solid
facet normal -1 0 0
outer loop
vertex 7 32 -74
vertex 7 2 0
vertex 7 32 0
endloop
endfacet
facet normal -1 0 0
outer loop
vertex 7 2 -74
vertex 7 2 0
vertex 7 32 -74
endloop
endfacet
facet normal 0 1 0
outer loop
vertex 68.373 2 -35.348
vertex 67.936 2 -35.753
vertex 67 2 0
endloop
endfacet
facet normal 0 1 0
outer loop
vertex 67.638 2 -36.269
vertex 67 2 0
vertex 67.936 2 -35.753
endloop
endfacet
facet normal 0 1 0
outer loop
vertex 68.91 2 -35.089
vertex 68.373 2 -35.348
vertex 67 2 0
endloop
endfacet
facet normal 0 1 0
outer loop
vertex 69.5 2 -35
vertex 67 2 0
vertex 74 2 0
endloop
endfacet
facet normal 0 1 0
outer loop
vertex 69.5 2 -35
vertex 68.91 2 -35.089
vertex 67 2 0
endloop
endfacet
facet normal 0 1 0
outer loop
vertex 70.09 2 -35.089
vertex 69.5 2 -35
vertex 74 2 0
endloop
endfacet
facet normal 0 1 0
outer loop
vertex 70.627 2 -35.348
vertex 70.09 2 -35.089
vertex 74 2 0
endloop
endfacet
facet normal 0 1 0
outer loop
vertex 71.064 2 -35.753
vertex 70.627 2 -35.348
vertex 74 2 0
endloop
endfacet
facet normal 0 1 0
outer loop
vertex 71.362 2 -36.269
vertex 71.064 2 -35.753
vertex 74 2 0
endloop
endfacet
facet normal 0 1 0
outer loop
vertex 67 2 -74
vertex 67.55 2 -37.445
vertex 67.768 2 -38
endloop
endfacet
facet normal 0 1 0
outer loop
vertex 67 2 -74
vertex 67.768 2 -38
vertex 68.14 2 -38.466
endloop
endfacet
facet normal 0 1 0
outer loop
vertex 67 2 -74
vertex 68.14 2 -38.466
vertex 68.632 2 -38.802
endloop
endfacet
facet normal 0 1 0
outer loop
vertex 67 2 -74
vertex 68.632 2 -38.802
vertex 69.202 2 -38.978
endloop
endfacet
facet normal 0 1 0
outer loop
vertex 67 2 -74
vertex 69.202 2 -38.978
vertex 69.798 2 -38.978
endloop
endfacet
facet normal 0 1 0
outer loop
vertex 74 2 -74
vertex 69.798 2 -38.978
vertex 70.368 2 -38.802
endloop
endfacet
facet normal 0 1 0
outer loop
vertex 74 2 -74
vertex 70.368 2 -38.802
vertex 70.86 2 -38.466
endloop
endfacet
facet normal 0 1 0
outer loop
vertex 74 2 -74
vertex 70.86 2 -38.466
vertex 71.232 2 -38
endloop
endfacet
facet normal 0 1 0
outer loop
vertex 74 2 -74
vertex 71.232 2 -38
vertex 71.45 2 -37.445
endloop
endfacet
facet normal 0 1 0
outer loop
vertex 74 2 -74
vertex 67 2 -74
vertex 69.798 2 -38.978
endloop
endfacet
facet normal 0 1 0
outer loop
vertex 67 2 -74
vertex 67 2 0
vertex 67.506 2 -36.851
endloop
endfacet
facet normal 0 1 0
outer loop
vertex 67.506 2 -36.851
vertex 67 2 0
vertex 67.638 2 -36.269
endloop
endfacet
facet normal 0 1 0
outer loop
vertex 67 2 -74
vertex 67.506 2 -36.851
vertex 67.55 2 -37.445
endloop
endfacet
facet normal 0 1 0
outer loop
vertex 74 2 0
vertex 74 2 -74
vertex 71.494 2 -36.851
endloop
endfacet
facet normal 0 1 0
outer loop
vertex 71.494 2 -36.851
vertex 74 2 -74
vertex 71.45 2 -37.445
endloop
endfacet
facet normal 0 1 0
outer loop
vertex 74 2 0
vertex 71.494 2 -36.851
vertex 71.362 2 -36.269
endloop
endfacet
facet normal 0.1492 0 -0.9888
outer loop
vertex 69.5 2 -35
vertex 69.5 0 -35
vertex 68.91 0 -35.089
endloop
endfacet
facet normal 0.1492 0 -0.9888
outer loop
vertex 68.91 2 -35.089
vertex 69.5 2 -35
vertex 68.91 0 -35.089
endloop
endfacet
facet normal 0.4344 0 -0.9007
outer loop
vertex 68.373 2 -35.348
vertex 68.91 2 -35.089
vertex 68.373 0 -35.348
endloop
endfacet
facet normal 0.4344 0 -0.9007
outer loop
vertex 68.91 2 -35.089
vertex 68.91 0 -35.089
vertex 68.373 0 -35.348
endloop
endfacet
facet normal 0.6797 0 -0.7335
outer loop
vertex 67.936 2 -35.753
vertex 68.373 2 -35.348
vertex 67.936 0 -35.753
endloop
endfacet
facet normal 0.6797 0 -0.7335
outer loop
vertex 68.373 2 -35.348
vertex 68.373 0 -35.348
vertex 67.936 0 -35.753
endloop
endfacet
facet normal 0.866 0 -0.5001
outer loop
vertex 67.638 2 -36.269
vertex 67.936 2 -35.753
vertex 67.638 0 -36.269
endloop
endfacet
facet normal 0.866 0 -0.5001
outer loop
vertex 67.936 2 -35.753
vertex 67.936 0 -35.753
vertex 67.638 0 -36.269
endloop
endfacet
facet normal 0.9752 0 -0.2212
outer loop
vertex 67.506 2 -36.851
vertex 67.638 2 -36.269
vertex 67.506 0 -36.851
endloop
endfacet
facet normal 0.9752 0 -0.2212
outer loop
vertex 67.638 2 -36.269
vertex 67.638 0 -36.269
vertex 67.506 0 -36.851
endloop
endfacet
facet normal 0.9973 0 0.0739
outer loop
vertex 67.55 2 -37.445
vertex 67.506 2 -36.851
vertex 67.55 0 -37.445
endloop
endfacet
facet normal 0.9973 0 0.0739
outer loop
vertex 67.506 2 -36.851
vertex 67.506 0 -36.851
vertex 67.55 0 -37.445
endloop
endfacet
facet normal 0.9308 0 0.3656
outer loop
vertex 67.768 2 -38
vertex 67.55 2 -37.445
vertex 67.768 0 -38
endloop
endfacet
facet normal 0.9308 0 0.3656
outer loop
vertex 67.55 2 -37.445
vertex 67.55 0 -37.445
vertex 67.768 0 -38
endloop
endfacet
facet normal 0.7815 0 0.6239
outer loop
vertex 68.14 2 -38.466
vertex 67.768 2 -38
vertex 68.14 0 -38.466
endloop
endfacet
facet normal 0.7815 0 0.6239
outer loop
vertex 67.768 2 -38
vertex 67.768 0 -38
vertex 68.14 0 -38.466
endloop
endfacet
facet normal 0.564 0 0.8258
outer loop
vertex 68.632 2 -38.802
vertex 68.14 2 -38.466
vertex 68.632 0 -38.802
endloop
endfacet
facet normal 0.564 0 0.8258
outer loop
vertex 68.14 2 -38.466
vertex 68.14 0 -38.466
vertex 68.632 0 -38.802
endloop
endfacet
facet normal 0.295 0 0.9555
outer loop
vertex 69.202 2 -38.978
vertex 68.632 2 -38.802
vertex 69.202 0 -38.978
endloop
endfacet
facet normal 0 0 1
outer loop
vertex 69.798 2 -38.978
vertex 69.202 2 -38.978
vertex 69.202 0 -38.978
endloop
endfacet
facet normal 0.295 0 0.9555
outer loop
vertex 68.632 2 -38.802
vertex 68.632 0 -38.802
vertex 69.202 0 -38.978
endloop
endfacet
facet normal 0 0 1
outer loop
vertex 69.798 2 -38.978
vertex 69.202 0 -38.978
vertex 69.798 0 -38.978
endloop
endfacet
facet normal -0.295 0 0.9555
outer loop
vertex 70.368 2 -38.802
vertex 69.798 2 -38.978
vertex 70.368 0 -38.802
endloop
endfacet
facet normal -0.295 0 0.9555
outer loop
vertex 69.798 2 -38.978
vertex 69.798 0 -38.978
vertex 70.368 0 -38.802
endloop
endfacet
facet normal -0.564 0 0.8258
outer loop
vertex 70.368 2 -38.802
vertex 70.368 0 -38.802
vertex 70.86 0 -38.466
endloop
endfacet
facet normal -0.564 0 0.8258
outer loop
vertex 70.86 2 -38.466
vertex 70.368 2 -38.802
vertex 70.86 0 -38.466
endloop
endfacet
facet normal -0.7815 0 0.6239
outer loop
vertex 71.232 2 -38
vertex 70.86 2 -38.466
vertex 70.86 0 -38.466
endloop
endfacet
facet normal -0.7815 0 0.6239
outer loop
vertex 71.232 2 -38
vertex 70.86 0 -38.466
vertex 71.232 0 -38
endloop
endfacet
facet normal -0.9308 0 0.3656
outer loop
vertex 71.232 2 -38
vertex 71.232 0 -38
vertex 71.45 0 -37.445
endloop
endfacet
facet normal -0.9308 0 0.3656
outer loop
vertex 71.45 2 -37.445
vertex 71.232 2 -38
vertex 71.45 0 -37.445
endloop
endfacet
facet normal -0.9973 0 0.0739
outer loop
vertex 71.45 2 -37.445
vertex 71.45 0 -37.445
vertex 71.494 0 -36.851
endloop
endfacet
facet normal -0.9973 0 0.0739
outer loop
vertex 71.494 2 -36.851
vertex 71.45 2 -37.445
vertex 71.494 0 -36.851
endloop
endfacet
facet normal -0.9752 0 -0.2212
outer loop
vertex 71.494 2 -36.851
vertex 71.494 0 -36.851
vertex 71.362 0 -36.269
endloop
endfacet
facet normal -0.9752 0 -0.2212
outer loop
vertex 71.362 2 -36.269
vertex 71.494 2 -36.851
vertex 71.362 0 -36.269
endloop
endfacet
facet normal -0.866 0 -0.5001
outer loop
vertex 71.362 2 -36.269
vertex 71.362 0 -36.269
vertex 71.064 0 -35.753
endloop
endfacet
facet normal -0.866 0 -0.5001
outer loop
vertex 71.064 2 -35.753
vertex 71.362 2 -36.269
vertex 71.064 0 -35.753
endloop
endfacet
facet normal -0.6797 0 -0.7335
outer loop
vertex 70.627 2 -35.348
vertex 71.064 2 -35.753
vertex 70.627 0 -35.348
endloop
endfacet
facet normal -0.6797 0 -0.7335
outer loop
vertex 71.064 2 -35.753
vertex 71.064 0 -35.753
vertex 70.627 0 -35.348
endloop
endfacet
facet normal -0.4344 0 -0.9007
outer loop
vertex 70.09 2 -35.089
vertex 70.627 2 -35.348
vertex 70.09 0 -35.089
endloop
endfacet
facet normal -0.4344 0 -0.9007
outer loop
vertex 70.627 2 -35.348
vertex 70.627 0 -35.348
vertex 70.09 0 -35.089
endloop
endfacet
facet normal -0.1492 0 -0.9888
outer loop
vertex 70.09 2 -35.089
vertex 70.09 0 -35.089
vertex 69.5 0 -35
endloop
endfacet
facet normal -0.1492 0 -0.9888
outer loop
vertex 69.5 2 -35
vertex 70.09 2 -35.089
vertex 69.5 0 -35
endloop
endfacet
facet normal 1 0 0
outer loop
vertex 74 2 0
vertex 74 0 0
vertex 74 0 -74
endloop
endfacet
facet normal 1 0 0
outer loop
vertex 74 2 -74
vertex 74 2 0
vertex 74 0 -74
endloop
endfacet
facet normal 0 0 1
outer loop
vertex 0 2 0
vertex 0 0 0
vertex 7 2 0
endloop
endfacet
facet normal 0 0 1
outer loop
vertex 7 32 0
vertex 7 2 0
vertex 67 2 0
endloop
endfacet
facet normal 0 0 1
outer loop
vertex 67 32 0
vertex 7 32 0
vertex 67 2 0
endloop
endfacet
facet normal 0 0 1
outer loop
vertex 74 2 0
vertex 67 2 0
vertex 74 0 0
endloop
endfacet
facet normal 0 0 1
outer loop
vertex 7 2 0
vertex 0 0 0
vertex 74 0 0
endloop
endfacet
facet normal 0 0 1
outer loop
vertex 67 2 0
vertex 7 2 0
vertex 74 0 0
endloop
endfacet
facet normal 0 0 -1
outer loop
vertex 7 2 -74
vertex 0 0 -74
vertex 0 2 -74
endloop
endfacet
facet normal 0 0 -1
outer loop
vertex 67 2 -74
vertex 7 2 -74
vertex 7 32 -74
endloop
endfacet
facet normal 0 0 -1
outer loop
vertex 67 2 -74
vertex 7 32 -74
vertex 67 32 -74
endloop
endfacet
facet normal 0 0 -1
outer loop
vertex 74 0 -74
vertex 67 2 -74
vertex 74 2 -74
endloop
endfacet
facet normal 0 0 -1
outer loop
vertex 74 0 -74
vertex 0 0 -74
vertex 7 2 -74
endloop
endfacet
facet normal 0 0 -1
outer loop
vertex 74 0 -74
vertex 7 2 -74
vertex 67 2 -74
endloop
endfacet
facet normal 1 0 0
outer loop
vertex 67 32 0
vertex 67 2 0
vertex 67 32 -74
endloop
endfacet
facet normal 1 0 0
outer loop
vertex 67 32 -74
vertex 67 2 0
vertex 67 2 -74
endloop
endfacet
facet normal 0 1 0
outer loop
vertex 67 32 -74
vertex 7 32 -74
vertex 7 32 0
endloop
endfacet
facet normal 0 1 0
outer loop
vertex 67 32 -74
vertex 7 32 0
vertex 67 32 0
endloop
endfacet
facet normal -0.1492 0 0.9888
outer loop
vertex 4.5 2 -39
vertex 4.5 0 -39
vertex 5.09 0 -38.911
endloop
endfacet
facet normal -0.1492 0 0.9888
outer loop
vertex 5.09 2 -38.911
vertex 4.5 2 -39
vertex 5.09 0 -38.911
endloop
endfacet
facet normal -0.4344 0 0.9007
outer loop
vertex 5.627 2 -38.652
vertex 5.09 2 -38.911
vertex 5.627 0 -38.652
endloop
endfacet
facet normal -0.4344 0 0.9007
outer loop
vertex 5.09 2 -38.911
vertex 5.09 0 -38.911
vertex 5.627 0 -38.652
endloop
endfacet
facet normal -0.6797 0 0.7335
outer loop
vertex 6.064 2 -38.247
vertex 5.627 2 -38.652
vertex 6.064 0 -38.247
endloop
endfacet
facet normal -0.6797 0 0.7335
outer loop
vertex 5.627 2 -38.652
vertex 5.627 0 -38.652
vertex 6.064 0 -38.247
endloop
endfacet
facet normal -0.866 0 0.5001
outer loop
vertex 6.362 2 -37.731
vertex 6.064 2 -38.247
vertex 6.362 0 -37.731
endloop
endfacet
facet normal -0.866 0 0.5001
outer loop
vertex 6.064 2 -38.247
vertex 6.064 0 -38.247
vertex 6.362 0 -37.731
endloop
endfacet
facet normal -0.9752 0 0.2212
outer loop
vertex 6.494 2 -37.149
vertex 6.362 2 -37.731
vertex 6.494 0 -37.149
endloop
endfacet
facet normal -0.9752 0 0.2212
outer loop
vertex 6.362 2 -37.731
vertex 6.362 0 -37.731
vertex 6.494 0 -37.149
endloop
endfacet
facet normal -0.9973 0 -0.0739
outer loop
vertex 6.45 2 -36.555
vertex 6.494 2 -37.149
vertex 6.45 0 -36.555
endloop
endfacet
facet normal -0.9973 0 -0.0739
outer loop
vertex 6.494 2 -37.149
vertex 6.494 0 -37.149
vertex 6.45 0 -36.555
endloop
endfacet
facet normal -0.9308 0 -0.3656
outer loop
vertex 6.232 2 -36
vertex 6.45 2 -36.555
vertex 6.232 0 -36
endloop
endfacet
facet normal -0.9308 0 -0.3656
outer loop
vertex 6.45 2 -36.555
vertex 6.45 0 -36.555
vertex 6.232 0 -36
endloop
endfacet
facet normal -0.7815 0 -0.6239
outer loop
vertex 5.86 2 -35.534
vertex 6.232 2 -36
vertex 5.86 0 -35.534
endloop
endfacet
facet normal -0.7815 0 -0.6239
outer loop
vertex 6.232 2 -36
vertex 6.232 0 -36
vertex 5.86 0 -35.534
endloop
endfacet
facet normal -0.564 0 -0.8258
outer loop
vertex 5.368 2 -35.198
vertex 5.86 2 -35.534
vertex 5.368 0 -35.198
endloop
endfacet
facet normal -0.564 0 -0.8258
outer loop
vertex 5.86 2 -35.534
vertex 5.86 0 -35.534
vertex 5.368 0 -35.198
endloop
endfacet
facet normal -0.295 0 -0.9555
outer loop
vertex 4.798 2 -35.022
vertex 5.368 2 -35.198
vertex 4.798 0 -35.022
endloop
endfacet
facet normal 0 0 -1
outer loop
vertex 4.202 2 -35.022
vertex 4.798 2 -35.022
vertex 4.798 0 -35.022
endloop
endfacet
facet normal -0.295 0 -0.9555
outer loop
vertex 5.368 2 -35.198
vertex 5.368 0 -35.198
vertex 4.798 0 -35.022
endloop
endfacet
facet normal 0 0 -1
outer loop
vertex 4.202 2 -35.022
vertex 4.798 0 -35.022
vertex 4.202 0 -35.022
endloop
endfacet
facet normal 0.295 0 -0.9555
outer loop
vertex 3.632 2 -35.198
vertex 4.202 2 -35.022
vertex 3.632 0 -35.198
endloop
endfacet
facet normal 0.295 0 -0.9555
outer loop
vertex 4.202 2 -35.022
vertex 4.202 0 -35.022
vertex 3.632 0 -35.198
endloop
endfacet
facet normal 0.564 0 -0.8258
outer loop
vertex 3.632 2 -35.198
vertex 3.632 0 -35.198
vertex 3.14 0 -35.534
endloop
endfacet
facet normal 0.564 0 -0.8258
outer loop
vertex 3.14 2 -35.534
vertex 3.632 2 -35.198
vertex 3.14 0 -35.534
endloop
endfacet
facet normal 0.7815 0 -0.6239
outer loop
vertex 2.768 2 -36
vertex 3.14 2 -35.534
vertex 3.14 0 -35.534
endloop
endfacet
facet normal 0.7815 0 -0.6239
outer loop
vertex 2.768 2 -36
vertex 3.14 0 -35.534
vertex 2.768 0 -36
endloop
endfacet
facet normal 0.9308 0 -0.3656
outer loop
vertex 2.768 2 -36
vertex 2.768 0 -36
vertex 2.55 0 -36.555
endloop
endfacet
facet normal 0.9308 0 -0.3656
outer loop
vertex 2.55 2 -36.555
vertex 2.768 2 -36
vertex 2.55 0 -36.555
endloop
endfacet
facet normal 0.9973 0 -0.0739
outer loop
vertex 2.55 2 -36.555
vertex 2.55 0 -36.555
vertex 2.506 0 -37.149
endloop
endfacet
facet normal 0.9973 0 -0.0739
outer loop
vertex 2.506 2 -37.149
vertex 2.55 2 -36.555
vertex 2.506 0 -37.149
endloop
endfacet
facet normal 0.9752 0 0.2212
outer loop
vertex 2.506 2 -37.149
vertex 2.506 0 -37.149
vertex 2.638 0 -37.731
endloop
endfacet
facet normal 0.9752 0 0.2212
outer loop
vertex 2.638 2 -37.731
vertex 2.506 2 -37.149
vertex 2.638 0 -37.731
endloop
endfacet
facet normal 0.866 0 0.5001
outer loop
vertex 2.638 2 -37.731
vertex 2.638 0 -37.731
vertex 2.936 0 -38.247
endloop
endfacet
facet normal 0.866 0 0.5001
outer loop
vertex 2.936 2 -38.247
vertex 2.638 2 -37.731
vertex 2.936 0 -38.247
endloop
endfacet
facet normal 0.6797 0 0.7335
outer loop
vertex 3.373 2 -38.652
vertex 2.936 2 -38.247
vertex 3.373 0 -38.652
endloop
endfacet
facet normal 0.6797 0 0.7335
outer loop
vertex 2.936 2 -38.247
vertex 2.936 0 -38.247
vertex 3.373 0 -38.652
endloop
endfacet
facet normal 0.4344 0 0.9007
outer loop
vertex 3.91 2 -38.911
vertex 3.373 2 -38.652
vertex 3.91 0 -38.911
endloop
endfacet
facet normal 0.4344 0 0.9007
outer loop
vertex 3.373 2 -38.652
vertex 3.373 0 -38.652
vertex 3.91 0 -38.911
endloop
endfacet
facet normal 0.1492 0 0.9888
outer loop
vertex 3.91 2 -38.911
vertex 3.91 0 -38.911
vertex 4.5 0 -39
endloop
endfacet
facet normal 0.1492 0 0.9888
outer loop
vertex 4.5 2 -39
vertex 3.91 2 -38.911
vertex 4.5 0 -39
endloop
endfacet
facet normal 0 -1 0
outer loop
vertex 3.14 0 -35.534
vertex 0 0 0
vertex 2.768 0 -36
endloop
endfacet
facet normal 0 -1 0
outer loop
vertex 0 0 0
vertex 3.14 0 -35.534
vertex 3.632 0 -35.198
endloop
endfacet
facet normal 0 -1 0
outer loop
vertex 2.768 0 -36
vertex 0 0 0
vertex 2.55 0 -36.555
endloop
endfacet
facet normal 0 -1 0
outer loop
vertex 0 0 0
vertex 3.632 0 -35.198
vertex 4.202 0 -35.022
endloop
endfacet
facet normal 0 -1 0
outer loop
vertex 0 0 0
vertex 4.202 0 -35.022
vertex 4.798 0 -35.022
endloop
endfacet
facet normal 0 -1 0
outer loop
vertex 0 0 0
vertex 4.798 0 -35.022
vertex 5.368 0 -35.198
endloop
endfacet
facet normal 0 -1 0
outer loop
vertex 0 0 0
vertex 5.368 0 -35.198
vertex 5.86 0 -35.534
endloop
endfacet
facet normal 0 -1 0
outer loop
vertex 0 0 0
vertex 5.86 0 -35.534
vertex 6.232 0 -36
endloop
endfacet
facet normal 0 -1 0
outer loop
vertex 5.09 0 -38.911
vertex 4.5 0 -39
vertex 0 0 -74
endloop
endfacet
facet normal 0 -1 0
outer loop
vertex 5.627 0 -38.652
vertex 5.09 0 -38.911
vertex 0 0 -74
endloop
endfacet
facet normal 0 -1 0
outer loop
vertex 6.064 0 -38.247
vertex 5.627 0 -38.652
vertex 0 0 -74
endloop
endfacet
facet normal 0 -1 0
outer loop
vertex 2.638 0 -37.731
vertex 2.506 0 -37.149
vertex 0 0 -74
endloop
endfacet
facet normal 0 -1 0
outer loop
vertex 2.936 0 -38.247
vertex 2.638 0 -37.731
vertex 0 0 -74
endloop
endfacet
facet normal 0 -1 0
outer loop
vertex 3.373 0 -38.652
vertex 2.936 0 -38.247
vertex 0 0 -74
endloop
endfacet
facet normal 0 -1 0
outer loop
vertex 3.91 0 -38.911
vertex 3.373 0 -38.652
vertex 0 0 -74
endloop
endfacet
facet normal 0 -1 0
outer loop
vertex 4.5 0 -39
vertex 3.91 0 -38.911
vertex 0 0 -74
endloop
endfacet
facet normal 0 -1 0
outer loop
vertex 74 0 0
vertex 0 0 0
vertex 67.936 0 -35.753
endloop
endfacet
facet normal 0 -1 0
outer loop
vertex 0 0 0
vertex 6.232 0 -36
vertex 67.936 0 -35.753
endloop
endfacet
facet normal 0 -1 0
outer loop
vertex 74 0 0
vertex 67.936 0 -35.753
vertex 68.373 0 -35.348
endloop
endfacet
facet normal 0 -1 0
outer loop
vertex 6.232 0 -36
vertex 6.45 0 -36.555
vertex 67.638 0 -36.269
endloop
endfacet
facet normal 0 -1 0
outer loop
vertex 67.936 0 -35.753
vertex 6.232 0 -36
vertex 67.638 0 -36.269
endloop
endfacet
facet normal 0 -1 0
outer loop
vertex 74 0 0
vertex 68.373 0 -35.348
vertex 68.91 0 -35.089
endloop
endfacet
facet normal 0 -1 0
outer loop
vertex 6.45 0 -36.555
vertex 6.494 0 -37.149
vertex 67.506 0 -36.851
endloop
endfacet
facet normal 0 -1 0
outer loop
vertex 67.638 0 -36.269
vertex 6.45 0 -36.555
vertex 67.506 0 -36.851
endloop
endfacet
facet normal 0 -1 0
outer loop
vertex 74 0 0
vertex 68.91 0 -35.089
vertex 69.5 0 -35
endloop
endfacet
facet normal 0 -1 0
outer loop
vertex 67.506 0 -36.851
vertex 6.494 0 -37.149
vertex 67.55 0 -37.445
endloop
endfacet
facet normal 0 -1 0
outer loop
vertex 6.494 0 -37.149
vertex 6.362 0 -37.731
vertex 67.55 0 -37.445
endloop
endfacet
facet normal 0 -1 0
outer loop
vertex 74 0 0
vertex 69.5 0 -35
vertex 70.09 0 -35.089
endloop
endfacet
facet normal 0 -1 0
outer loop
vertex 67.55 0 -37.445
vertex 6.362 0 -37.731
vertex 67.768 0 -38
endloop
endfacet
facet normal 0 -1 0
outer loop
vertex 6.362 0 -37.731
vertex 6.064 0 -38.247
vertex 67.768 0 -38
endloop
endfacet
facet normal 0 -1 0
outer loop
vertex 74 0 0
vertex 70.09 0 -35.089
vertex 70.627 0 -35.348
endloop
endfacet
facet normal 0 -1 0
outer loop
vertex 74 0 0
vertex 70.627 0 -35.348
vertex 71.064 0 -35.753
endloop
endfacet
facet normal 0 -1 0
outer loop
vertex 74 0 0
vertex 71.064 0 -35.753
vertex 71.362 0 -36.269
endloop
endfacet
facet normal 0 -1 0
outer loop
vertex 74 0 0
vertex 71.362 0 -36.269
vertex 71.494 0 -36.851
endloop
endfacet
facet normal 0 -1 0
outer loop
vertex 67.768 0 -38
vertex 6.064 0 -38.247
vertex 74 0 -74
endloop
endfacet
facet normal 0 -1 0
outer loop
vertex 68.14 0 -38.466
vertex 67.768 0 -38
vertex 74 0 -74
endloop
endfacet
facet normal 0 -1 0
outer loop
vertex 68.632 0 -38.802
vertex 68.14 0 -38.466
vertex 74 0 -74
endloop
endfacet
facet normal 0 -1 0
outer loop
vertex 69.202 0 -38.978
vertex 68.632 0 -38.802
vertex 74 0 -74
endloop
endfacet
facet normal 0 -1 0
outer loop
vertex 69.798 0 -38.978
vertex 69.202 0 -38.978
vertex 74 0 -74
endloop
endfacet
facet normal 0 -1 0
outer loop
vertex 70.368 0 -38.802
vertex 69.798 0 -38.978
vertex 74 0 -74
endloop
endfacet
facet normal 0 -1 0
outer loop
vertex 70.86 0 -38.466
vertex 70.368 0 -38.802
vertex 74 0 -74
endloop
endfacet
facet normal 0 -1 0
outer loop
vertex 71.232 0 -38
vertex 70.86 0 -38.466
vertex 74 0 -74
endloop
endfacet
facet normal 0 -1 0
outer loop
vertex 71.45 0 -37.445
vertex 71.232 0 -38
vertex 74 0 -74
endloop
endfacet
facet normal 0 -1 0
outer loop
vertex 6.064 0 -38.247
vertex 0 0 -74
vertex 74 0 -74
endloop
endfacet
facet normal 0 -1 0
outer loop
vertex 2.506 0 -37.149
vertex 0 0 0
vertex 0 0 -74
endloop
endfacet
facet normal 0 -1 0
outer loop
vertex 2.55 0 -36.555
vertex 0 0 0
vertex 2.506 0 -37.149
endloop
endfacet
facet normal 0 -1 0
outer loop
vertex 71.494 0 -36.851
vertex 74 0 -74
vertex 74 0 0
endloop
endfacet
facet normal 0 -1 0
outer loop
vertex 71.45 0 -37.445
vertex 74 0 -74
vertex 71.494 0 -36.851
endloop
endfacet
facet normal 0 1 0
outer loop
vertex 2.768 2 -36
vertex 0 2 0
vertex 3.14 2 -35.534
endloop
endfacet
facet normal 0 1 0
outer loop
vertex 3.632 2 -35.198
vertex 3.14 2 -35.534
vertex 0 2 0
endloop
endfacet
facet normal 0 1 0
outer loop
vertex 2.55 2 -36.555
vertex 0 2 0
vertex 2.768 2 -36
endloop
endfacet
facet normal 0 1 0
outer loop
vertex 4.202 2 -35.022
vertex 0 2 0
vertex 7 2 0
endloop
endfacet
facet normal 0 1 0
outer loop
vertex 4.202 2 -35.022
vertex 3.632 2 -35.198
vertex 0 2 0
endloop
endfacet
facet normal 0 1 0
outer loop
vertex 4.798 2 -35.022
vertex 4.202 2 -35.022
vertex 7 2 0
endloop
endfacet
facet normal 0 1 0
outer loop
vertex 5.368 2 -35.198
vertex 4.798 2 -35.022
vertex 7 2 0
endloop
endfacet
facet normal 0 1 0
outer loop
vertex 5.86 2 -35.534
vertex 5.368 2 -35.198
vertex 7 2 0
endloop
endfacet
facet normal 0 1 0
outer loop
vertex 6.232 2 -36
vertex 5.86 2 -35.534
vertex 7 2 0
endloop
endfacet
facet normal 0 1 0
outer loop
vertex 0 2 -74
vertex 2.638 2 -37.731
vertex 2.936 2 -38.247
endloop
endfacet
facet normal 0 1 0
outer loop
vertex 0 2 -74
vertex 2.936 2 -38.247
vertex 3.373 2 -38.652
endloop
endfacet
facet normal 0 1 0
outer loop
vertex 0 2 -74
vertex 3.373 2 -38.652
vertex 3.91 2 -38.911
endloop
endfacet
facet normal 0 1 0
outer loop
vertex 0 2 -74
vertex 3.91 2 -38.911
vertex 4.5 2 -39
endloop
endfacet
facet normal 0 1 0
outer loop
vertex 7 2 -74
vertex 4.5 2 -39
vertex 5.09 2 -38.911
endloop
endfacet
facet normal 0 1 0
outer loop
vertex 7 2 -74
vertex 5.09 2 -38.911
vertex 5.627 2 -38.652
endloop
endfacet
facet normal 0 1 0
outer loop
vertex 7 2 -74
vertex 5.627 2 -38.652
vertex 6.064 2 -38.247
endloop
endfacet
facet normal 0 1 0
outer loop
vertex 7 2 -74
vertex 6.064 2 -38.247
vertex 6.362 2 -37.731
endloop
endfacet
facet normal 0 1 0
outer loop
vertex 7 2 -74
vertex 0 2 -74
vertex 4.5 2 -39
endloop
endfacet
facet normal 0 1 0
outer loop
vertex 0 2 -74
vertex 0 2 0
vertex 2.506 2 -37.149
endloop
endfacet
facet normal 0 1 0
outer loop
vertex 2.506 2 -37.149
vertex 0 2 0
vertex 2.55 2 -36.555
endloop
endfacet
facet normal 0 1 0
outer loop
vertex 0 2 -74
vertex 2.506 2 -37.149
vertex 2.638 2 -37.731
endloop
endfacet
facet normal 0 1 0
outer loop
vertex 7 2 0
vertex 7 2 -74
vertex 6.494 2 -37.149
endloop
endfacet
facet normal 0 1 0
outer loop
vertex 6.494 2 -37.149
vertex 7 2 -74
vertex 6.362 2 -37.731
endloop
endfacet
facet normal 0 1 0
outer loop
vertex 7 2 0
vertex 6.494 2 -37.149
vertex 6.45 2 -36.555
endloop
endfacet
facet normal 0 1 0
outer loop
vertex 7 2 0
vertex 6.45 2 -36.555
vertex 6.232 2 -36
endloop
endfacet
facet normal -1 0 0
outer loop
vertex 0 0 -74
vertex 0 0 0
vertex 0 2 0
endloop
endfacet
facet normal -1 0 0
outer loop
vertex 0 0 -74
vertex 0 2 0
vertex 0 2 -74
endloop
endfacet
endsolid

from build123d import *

# Parameters (mm, degrees)
SKETCH1_W           = 74
SKETCH1_H           = 74
BOSS_EXTRUDE1_DEPTH = 2
SKETCH2_W           = 60
SKETCH2_H           = 74
BOSS_EXTRUDE2_DEPTH = 30
SKETCH3_R           = 2
CUT_EXTRUDE1_DEPTH  = 2


with BuildPart() as part:
    # Sketch1 → Boss-Extrude1 (new body)
    with BuildSketch(Plane(origin=(0, 0, 0), x_dir=(1, 0, 0), z_dir=(0, 1, 0))):
        with Locations((37, 37)):
            Rectangle(SKETCH1_W, SKETCH1_H)
    extrude(amount=BOSS_EXTRUDE1_DEPTH)

    # Sketch2 → Boss-Extrude2 (add)
    with BuildSketch(Plane(origin=(0, 2, 0), x_dir=(1, 0, 0), z_dir=(0, 1, 0))):
        with Locations((37, 37)):
            Rectangle(SKETCH2_W, SKETCH2_H)
    extrude(amount=BOSS_EXTRUDE2_DEPTH)

    # Sketch3 → Cut-Extrude1 (cut)
    with BuildSketch(Plane.XZ):
        with Locations(Location((4.5, -37, 0), (0, 0, 270))):
            Circle(SKETCH3_R)
        with Locations(Location((69.5, -37, 0), (0, 0, 90))):
            Circle(SKETCH3_R)
    extrude(amount=-CUT_EXTRUDE1_DEPTH, mode=Mode.SUBTRACT)


solid = part.part
